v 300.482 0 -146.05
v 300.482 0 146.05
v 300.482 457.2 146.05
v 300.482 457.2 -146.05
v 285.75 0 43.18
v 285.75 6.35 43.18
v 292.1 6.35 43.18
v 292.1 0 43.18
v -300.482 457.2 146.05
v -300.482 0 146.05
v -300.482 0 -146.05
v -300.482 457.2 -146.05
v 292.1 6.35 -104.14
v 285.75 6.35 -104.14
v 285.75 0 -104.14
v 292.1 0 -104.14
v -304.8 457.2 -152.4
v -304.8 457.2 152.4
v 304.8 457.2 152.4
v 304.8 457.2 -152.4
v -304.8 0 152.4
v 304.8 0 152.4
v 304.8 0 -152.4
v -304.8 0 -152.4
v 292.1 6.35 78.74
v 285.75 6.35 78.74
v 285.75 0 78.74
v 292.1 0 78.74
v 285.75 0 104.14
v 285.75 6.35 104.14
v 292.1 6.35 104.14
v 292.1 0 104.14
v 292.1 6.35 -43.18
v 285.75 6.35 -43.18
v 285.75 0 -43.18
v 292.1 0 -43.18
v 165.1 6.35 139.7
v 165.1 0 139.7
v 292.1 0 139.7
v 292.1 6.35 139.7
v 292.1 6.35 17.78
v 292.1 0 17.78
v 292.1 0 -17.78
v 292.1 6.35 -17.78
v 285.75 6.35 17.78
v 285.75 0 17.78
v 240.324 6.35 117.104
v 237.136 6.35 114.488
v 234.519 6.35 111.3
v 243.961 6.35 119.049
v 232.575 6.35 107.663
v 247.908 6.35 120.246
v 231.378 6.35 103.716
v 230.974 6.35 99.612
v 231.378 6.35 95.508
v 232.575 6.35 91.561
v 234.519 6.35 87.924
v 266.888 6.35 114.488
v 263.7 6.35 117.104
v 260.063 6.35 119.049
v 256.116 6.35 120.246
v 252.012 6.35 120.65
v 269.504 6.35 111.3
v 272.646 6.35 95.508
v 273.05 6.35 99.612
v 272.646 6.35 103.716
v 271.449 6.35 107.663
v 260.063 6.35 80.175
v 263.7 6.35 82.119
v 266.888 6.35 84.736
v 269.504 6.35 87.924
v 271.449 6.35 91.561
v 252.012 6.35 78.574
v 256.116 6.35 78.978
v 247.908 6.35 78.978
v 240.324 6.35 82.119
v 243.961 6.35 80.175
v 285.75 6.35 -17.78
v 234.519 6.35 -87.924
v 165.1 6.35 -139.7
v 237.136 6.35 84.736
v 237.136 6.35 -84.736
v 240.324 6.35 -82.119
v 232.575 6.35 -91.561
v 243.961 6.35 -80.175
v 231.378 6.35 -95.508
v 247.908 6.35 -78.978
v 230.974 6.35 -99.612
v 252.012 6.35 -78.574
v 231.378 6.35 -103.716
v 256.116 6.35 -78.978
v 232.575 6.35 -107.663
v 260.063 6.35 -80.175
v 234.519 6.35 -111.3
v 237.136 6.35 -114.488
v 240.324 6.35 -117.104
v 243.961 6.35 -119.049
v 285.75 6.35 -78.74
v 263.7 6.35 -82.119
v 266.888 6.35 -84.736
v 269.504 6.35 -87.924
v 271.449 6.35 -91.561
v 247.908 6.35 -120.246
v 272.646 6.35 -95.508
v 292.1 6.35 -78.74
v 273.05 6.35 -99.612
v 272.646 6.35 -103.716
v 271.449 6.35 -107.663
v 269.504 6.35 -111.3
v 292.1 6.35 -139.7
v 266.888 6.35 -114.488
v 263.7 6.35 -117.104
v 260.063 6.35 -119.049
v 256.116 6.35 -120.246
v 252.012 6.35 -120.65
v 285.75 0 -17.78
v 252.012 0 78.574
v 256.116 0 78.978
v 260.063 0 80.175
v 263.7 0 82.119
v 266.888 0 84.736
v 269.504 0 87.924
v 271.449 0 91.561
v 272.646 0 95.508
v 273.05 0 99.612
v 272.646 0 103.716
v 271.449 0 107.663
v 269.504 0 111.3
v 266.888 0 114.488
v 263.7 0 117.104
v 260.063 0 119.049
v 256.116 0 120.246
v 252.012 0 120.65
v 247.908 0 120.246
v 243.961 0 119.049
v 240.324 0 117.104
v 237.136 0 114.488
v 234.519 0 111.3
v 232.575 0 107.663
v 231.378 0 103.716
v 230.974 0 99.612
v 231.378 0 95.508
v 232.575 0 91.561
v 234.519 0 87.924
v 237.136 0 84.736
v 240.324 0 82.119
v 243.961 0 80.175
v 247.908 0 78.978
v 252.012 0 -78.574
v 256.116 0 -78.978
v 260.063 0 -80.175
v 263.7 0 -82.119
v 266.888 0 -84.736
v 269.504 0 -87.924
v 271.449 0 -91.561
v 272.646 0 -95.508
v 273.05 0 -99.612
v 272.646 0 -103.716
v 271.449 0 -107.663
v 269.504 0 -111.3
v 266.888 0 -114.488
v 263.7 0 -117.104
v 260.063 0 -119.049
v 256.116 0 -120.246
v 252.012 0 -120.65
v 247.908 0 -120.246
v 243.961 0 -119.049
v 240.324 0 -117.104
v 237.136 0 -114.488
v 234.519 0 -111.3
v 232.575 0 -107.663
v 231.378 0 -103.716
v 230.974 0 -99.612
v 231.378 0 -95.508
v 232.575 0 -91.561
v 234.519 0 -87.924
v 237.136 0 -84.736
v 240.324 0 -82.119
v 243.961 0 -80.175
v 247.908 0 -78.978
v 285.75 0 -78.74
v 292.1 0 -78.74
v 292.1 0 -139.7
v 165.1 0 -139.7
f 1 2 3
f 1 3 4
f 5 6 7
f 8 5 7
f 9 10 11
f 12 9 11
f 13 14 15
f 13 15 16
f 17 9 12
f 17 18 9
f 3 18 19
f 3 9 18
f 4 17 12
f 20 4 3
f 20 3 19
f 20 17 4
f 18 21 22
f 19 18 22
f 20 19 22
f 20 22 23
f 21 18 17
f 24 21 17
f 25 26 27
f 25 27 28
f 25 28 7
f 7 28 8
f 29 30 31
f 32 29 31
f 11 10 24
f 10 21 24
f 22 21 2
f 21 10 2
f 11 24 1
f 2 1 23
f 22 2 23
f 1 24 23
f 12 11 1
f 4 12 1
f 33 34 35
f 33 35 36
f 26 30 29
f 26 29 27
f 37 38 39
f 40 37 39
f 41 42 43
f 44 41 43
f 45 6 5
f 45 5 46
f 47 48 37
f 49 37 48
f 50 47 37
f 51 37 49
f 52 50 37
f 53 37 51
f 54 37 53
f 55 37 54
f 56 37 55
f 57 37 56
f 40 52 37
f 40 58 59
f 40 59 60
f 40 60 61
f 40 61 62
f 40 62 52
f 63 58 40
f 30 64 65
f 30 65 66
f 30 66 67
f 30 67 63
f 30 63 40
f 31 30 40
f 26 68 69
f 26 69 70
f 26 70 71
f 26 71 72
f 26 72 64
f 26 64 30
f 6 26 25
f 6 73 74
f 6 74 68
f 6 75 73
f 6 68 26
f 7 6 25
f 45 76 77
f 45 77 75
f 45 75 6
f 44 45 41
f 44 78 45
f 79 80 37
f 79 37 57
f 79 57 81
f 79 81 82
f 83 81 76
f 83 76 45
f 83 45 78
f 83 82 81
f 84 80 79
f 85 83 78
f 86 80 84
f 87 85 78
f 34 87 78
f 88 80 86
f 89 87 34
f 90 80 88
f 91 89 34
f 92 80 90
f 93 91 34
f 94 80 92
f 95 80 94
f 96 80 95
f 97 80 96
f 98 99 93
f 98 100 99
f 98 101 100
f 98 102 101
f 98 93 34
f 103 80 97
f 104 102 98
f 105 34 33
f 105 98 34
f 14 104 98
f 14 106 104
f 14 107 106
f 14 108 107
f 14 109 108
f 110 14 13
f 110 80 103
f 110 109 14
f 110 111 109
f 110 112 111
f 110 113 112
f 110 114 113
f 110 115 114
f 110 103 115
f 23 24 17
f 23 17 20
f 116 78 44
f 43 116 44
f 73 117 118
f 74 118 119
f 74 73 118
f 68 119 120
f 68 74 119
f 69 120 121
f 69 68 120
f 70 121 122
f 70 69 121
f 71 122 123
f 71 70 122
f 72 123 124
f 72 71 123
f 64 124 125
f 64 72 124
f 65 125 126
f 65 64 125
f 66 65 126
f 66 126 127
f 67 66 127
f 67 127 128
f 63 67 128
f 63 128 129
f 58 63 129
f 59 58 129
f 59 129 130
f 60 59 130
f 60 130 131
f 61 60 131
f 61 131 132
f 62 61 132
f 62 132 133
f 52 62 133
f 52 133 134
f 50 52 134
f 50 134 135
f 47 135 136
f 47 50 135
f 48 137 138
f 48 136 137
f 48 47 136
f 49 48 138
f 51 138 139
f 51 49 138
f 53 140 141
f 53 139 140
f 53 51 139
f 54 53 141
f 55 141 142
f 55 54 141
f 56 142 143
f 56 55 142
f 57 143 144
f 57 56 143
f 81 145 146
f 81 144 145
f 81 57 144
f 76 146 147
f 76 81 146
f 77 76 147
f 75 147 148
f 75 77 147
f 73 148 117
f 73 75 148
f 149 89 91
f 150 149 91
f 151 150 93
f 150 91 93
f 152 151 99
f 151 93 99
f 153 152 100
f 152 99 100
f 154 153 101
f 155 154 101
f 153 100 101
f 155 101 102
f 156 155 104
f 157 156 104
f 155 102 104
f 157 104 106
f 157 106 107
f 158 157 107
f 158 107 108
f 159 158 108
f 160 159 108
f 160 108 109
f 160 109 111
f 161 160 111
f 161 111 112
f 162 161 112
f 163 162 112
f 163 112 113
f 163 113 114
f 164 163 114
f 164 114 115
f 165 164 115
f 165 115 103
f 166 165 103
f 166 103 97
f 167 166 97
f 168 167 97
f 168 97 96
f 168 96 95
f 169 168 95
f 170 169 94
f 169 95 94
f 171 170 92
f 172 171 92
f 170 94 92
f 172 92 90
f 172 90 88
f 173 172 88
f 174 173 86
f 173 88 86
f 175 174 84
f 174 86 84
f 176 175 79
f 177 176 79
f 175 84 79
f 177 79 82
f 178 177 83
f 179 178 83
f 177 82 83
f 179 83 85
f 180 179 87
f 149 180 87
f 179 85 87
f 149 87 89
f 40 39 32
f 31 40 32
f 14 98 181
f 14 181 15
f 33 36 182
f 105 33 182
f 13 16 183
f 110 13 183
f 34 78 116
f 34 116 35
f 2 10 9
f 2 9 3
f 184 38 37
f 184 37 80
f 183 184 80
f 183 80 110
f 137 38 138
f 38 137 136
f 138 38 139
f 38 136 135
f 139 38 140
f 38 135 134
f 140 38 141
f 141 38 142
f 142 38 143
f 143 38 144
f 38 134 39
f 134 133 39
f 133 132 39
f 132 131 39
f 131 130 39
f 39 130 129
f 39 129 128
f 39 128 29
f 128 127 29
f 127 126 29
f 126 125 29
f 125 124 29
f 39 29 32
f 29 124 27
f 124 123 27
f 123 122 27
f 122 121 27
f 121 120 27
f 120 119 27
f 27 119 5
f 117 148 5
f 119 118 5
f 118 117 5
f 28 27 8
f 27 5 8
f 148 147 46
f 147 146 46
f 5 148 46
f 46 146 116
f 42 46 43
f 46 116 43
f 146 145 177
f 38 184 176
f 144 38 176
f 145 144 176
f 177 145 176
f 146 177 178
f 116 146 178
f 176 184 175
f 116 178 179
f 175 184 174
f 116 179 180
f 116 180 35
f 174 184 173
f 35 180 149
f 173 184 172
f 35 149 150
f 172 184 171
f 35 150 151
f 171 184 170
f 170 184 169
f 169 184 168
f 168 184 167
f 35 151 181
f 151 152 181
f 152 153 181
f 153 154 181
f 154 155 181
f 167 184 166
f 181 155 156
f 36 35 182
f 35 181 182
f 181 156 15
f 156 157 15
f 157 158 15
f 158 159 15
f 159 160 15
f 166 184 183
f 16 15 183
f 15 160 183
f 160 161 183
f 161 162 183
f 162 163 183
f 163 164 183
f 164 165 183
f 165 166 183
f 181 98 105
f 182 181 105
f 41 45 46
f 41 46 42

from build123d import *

# Parameters (mm, degrees)
SKETCH1_W           = 127
SKETCH1_H           = 279.4
BOSS_EXTRUDE1_DEPTH = 6.35
SKETCH3_W           = 609.6
SKETCH3_H           = 304.8
SKETCH3_W_2         = 600.964
SKETCH3_H_2         = 292.1
BOSS_EXTRUDE3_DEPTH = 457.2
SKETCH4_R           = 21.038100037
CUT_EXTRUDE1_DEPTH  = 566.15
SKETCH5_W           = 6.35
SKETCH5_H           = 25.4
CUT_EXTRUDE2_DEPTH  = 566.15


with BuildPart() as part:
    # Sketch1 → Boss-Extrude1 (new body)
    with BuildSketch(Plane(origin=(0, 0, 0), x_dir=(1, 0, 0), z_dir=(0, 1, 0))):
        with Locations((228.6, 0)):
            Rectangle(SKETCH1_W, SKETCH1_H)
    extrude(amount=BOSS_EXTRUDE1_DEPTH)

    # Sketch4 → Cut-Extrude1 (cut, through all)
    with BuildSketch(Plane(origin=(0, 6.35, 0), x_dir=(1, 0, 0), z_dir=(0, 1, 0))):
        with Locations(Location((252.011899963, 99.611899963, 0), (0, 0, 270))):
            Circle(SKETCH4_R)
    cut_extrude1 = extrude(amount=-CUT_EXTRUDE1_DEPTH, mode=Mode.SUBTRACT)

    # Mirror1: Cut-Extrude1 across plane
    add(cut_extrude1.mirror(Plane.XY), mode=Mode.SUBTRACT)

    # Sketch5 → Cut-Extrude2 (cut, through all)
    with BuildSketch(Plane(origin=(0, 6.35, 0), x_dir=(1, 0, 0), z_dir=(0, 1, 0))):
        with Locations((288.925, 30.48)):
            Rectangle(SKETCH5_W, SKETCH5_H)
        with Locations((288.925, 91.44)):
            Rectangle(SKETCH5_W, SKETCH5_H)
        with Locations((288.925, -91.44)):
            Rectangle(SKETCH5_W, SKETCH5_H)
        with Locations((288.925, -30.48)):
            Rectangle(SKETCH5_W, SKETCH5_H)
    extrude(amount=-CUT_EXTRUDE2_DEPTH, mode=Mode.SUBTRACT)


with BuildPart() as body_2:
    # Sketch3 → Boss-Extrude3 (new body)
    with BuildSketch(Plane(origin=(0, 0, 0), x_dir=(1, 0, 0), z_dir=(0, 1, 0))):
        Rectangle(SKETCH3_W, SKETCH3_H)
        Rectangle(SKETCH3_W_2, SKETCH3_H_2, mode=Mode.SUBTRACT)
    extrude(amount=BOSS_EXTRUDE3_DEPTH)


solid = Compound([part.part, body_2.part])
